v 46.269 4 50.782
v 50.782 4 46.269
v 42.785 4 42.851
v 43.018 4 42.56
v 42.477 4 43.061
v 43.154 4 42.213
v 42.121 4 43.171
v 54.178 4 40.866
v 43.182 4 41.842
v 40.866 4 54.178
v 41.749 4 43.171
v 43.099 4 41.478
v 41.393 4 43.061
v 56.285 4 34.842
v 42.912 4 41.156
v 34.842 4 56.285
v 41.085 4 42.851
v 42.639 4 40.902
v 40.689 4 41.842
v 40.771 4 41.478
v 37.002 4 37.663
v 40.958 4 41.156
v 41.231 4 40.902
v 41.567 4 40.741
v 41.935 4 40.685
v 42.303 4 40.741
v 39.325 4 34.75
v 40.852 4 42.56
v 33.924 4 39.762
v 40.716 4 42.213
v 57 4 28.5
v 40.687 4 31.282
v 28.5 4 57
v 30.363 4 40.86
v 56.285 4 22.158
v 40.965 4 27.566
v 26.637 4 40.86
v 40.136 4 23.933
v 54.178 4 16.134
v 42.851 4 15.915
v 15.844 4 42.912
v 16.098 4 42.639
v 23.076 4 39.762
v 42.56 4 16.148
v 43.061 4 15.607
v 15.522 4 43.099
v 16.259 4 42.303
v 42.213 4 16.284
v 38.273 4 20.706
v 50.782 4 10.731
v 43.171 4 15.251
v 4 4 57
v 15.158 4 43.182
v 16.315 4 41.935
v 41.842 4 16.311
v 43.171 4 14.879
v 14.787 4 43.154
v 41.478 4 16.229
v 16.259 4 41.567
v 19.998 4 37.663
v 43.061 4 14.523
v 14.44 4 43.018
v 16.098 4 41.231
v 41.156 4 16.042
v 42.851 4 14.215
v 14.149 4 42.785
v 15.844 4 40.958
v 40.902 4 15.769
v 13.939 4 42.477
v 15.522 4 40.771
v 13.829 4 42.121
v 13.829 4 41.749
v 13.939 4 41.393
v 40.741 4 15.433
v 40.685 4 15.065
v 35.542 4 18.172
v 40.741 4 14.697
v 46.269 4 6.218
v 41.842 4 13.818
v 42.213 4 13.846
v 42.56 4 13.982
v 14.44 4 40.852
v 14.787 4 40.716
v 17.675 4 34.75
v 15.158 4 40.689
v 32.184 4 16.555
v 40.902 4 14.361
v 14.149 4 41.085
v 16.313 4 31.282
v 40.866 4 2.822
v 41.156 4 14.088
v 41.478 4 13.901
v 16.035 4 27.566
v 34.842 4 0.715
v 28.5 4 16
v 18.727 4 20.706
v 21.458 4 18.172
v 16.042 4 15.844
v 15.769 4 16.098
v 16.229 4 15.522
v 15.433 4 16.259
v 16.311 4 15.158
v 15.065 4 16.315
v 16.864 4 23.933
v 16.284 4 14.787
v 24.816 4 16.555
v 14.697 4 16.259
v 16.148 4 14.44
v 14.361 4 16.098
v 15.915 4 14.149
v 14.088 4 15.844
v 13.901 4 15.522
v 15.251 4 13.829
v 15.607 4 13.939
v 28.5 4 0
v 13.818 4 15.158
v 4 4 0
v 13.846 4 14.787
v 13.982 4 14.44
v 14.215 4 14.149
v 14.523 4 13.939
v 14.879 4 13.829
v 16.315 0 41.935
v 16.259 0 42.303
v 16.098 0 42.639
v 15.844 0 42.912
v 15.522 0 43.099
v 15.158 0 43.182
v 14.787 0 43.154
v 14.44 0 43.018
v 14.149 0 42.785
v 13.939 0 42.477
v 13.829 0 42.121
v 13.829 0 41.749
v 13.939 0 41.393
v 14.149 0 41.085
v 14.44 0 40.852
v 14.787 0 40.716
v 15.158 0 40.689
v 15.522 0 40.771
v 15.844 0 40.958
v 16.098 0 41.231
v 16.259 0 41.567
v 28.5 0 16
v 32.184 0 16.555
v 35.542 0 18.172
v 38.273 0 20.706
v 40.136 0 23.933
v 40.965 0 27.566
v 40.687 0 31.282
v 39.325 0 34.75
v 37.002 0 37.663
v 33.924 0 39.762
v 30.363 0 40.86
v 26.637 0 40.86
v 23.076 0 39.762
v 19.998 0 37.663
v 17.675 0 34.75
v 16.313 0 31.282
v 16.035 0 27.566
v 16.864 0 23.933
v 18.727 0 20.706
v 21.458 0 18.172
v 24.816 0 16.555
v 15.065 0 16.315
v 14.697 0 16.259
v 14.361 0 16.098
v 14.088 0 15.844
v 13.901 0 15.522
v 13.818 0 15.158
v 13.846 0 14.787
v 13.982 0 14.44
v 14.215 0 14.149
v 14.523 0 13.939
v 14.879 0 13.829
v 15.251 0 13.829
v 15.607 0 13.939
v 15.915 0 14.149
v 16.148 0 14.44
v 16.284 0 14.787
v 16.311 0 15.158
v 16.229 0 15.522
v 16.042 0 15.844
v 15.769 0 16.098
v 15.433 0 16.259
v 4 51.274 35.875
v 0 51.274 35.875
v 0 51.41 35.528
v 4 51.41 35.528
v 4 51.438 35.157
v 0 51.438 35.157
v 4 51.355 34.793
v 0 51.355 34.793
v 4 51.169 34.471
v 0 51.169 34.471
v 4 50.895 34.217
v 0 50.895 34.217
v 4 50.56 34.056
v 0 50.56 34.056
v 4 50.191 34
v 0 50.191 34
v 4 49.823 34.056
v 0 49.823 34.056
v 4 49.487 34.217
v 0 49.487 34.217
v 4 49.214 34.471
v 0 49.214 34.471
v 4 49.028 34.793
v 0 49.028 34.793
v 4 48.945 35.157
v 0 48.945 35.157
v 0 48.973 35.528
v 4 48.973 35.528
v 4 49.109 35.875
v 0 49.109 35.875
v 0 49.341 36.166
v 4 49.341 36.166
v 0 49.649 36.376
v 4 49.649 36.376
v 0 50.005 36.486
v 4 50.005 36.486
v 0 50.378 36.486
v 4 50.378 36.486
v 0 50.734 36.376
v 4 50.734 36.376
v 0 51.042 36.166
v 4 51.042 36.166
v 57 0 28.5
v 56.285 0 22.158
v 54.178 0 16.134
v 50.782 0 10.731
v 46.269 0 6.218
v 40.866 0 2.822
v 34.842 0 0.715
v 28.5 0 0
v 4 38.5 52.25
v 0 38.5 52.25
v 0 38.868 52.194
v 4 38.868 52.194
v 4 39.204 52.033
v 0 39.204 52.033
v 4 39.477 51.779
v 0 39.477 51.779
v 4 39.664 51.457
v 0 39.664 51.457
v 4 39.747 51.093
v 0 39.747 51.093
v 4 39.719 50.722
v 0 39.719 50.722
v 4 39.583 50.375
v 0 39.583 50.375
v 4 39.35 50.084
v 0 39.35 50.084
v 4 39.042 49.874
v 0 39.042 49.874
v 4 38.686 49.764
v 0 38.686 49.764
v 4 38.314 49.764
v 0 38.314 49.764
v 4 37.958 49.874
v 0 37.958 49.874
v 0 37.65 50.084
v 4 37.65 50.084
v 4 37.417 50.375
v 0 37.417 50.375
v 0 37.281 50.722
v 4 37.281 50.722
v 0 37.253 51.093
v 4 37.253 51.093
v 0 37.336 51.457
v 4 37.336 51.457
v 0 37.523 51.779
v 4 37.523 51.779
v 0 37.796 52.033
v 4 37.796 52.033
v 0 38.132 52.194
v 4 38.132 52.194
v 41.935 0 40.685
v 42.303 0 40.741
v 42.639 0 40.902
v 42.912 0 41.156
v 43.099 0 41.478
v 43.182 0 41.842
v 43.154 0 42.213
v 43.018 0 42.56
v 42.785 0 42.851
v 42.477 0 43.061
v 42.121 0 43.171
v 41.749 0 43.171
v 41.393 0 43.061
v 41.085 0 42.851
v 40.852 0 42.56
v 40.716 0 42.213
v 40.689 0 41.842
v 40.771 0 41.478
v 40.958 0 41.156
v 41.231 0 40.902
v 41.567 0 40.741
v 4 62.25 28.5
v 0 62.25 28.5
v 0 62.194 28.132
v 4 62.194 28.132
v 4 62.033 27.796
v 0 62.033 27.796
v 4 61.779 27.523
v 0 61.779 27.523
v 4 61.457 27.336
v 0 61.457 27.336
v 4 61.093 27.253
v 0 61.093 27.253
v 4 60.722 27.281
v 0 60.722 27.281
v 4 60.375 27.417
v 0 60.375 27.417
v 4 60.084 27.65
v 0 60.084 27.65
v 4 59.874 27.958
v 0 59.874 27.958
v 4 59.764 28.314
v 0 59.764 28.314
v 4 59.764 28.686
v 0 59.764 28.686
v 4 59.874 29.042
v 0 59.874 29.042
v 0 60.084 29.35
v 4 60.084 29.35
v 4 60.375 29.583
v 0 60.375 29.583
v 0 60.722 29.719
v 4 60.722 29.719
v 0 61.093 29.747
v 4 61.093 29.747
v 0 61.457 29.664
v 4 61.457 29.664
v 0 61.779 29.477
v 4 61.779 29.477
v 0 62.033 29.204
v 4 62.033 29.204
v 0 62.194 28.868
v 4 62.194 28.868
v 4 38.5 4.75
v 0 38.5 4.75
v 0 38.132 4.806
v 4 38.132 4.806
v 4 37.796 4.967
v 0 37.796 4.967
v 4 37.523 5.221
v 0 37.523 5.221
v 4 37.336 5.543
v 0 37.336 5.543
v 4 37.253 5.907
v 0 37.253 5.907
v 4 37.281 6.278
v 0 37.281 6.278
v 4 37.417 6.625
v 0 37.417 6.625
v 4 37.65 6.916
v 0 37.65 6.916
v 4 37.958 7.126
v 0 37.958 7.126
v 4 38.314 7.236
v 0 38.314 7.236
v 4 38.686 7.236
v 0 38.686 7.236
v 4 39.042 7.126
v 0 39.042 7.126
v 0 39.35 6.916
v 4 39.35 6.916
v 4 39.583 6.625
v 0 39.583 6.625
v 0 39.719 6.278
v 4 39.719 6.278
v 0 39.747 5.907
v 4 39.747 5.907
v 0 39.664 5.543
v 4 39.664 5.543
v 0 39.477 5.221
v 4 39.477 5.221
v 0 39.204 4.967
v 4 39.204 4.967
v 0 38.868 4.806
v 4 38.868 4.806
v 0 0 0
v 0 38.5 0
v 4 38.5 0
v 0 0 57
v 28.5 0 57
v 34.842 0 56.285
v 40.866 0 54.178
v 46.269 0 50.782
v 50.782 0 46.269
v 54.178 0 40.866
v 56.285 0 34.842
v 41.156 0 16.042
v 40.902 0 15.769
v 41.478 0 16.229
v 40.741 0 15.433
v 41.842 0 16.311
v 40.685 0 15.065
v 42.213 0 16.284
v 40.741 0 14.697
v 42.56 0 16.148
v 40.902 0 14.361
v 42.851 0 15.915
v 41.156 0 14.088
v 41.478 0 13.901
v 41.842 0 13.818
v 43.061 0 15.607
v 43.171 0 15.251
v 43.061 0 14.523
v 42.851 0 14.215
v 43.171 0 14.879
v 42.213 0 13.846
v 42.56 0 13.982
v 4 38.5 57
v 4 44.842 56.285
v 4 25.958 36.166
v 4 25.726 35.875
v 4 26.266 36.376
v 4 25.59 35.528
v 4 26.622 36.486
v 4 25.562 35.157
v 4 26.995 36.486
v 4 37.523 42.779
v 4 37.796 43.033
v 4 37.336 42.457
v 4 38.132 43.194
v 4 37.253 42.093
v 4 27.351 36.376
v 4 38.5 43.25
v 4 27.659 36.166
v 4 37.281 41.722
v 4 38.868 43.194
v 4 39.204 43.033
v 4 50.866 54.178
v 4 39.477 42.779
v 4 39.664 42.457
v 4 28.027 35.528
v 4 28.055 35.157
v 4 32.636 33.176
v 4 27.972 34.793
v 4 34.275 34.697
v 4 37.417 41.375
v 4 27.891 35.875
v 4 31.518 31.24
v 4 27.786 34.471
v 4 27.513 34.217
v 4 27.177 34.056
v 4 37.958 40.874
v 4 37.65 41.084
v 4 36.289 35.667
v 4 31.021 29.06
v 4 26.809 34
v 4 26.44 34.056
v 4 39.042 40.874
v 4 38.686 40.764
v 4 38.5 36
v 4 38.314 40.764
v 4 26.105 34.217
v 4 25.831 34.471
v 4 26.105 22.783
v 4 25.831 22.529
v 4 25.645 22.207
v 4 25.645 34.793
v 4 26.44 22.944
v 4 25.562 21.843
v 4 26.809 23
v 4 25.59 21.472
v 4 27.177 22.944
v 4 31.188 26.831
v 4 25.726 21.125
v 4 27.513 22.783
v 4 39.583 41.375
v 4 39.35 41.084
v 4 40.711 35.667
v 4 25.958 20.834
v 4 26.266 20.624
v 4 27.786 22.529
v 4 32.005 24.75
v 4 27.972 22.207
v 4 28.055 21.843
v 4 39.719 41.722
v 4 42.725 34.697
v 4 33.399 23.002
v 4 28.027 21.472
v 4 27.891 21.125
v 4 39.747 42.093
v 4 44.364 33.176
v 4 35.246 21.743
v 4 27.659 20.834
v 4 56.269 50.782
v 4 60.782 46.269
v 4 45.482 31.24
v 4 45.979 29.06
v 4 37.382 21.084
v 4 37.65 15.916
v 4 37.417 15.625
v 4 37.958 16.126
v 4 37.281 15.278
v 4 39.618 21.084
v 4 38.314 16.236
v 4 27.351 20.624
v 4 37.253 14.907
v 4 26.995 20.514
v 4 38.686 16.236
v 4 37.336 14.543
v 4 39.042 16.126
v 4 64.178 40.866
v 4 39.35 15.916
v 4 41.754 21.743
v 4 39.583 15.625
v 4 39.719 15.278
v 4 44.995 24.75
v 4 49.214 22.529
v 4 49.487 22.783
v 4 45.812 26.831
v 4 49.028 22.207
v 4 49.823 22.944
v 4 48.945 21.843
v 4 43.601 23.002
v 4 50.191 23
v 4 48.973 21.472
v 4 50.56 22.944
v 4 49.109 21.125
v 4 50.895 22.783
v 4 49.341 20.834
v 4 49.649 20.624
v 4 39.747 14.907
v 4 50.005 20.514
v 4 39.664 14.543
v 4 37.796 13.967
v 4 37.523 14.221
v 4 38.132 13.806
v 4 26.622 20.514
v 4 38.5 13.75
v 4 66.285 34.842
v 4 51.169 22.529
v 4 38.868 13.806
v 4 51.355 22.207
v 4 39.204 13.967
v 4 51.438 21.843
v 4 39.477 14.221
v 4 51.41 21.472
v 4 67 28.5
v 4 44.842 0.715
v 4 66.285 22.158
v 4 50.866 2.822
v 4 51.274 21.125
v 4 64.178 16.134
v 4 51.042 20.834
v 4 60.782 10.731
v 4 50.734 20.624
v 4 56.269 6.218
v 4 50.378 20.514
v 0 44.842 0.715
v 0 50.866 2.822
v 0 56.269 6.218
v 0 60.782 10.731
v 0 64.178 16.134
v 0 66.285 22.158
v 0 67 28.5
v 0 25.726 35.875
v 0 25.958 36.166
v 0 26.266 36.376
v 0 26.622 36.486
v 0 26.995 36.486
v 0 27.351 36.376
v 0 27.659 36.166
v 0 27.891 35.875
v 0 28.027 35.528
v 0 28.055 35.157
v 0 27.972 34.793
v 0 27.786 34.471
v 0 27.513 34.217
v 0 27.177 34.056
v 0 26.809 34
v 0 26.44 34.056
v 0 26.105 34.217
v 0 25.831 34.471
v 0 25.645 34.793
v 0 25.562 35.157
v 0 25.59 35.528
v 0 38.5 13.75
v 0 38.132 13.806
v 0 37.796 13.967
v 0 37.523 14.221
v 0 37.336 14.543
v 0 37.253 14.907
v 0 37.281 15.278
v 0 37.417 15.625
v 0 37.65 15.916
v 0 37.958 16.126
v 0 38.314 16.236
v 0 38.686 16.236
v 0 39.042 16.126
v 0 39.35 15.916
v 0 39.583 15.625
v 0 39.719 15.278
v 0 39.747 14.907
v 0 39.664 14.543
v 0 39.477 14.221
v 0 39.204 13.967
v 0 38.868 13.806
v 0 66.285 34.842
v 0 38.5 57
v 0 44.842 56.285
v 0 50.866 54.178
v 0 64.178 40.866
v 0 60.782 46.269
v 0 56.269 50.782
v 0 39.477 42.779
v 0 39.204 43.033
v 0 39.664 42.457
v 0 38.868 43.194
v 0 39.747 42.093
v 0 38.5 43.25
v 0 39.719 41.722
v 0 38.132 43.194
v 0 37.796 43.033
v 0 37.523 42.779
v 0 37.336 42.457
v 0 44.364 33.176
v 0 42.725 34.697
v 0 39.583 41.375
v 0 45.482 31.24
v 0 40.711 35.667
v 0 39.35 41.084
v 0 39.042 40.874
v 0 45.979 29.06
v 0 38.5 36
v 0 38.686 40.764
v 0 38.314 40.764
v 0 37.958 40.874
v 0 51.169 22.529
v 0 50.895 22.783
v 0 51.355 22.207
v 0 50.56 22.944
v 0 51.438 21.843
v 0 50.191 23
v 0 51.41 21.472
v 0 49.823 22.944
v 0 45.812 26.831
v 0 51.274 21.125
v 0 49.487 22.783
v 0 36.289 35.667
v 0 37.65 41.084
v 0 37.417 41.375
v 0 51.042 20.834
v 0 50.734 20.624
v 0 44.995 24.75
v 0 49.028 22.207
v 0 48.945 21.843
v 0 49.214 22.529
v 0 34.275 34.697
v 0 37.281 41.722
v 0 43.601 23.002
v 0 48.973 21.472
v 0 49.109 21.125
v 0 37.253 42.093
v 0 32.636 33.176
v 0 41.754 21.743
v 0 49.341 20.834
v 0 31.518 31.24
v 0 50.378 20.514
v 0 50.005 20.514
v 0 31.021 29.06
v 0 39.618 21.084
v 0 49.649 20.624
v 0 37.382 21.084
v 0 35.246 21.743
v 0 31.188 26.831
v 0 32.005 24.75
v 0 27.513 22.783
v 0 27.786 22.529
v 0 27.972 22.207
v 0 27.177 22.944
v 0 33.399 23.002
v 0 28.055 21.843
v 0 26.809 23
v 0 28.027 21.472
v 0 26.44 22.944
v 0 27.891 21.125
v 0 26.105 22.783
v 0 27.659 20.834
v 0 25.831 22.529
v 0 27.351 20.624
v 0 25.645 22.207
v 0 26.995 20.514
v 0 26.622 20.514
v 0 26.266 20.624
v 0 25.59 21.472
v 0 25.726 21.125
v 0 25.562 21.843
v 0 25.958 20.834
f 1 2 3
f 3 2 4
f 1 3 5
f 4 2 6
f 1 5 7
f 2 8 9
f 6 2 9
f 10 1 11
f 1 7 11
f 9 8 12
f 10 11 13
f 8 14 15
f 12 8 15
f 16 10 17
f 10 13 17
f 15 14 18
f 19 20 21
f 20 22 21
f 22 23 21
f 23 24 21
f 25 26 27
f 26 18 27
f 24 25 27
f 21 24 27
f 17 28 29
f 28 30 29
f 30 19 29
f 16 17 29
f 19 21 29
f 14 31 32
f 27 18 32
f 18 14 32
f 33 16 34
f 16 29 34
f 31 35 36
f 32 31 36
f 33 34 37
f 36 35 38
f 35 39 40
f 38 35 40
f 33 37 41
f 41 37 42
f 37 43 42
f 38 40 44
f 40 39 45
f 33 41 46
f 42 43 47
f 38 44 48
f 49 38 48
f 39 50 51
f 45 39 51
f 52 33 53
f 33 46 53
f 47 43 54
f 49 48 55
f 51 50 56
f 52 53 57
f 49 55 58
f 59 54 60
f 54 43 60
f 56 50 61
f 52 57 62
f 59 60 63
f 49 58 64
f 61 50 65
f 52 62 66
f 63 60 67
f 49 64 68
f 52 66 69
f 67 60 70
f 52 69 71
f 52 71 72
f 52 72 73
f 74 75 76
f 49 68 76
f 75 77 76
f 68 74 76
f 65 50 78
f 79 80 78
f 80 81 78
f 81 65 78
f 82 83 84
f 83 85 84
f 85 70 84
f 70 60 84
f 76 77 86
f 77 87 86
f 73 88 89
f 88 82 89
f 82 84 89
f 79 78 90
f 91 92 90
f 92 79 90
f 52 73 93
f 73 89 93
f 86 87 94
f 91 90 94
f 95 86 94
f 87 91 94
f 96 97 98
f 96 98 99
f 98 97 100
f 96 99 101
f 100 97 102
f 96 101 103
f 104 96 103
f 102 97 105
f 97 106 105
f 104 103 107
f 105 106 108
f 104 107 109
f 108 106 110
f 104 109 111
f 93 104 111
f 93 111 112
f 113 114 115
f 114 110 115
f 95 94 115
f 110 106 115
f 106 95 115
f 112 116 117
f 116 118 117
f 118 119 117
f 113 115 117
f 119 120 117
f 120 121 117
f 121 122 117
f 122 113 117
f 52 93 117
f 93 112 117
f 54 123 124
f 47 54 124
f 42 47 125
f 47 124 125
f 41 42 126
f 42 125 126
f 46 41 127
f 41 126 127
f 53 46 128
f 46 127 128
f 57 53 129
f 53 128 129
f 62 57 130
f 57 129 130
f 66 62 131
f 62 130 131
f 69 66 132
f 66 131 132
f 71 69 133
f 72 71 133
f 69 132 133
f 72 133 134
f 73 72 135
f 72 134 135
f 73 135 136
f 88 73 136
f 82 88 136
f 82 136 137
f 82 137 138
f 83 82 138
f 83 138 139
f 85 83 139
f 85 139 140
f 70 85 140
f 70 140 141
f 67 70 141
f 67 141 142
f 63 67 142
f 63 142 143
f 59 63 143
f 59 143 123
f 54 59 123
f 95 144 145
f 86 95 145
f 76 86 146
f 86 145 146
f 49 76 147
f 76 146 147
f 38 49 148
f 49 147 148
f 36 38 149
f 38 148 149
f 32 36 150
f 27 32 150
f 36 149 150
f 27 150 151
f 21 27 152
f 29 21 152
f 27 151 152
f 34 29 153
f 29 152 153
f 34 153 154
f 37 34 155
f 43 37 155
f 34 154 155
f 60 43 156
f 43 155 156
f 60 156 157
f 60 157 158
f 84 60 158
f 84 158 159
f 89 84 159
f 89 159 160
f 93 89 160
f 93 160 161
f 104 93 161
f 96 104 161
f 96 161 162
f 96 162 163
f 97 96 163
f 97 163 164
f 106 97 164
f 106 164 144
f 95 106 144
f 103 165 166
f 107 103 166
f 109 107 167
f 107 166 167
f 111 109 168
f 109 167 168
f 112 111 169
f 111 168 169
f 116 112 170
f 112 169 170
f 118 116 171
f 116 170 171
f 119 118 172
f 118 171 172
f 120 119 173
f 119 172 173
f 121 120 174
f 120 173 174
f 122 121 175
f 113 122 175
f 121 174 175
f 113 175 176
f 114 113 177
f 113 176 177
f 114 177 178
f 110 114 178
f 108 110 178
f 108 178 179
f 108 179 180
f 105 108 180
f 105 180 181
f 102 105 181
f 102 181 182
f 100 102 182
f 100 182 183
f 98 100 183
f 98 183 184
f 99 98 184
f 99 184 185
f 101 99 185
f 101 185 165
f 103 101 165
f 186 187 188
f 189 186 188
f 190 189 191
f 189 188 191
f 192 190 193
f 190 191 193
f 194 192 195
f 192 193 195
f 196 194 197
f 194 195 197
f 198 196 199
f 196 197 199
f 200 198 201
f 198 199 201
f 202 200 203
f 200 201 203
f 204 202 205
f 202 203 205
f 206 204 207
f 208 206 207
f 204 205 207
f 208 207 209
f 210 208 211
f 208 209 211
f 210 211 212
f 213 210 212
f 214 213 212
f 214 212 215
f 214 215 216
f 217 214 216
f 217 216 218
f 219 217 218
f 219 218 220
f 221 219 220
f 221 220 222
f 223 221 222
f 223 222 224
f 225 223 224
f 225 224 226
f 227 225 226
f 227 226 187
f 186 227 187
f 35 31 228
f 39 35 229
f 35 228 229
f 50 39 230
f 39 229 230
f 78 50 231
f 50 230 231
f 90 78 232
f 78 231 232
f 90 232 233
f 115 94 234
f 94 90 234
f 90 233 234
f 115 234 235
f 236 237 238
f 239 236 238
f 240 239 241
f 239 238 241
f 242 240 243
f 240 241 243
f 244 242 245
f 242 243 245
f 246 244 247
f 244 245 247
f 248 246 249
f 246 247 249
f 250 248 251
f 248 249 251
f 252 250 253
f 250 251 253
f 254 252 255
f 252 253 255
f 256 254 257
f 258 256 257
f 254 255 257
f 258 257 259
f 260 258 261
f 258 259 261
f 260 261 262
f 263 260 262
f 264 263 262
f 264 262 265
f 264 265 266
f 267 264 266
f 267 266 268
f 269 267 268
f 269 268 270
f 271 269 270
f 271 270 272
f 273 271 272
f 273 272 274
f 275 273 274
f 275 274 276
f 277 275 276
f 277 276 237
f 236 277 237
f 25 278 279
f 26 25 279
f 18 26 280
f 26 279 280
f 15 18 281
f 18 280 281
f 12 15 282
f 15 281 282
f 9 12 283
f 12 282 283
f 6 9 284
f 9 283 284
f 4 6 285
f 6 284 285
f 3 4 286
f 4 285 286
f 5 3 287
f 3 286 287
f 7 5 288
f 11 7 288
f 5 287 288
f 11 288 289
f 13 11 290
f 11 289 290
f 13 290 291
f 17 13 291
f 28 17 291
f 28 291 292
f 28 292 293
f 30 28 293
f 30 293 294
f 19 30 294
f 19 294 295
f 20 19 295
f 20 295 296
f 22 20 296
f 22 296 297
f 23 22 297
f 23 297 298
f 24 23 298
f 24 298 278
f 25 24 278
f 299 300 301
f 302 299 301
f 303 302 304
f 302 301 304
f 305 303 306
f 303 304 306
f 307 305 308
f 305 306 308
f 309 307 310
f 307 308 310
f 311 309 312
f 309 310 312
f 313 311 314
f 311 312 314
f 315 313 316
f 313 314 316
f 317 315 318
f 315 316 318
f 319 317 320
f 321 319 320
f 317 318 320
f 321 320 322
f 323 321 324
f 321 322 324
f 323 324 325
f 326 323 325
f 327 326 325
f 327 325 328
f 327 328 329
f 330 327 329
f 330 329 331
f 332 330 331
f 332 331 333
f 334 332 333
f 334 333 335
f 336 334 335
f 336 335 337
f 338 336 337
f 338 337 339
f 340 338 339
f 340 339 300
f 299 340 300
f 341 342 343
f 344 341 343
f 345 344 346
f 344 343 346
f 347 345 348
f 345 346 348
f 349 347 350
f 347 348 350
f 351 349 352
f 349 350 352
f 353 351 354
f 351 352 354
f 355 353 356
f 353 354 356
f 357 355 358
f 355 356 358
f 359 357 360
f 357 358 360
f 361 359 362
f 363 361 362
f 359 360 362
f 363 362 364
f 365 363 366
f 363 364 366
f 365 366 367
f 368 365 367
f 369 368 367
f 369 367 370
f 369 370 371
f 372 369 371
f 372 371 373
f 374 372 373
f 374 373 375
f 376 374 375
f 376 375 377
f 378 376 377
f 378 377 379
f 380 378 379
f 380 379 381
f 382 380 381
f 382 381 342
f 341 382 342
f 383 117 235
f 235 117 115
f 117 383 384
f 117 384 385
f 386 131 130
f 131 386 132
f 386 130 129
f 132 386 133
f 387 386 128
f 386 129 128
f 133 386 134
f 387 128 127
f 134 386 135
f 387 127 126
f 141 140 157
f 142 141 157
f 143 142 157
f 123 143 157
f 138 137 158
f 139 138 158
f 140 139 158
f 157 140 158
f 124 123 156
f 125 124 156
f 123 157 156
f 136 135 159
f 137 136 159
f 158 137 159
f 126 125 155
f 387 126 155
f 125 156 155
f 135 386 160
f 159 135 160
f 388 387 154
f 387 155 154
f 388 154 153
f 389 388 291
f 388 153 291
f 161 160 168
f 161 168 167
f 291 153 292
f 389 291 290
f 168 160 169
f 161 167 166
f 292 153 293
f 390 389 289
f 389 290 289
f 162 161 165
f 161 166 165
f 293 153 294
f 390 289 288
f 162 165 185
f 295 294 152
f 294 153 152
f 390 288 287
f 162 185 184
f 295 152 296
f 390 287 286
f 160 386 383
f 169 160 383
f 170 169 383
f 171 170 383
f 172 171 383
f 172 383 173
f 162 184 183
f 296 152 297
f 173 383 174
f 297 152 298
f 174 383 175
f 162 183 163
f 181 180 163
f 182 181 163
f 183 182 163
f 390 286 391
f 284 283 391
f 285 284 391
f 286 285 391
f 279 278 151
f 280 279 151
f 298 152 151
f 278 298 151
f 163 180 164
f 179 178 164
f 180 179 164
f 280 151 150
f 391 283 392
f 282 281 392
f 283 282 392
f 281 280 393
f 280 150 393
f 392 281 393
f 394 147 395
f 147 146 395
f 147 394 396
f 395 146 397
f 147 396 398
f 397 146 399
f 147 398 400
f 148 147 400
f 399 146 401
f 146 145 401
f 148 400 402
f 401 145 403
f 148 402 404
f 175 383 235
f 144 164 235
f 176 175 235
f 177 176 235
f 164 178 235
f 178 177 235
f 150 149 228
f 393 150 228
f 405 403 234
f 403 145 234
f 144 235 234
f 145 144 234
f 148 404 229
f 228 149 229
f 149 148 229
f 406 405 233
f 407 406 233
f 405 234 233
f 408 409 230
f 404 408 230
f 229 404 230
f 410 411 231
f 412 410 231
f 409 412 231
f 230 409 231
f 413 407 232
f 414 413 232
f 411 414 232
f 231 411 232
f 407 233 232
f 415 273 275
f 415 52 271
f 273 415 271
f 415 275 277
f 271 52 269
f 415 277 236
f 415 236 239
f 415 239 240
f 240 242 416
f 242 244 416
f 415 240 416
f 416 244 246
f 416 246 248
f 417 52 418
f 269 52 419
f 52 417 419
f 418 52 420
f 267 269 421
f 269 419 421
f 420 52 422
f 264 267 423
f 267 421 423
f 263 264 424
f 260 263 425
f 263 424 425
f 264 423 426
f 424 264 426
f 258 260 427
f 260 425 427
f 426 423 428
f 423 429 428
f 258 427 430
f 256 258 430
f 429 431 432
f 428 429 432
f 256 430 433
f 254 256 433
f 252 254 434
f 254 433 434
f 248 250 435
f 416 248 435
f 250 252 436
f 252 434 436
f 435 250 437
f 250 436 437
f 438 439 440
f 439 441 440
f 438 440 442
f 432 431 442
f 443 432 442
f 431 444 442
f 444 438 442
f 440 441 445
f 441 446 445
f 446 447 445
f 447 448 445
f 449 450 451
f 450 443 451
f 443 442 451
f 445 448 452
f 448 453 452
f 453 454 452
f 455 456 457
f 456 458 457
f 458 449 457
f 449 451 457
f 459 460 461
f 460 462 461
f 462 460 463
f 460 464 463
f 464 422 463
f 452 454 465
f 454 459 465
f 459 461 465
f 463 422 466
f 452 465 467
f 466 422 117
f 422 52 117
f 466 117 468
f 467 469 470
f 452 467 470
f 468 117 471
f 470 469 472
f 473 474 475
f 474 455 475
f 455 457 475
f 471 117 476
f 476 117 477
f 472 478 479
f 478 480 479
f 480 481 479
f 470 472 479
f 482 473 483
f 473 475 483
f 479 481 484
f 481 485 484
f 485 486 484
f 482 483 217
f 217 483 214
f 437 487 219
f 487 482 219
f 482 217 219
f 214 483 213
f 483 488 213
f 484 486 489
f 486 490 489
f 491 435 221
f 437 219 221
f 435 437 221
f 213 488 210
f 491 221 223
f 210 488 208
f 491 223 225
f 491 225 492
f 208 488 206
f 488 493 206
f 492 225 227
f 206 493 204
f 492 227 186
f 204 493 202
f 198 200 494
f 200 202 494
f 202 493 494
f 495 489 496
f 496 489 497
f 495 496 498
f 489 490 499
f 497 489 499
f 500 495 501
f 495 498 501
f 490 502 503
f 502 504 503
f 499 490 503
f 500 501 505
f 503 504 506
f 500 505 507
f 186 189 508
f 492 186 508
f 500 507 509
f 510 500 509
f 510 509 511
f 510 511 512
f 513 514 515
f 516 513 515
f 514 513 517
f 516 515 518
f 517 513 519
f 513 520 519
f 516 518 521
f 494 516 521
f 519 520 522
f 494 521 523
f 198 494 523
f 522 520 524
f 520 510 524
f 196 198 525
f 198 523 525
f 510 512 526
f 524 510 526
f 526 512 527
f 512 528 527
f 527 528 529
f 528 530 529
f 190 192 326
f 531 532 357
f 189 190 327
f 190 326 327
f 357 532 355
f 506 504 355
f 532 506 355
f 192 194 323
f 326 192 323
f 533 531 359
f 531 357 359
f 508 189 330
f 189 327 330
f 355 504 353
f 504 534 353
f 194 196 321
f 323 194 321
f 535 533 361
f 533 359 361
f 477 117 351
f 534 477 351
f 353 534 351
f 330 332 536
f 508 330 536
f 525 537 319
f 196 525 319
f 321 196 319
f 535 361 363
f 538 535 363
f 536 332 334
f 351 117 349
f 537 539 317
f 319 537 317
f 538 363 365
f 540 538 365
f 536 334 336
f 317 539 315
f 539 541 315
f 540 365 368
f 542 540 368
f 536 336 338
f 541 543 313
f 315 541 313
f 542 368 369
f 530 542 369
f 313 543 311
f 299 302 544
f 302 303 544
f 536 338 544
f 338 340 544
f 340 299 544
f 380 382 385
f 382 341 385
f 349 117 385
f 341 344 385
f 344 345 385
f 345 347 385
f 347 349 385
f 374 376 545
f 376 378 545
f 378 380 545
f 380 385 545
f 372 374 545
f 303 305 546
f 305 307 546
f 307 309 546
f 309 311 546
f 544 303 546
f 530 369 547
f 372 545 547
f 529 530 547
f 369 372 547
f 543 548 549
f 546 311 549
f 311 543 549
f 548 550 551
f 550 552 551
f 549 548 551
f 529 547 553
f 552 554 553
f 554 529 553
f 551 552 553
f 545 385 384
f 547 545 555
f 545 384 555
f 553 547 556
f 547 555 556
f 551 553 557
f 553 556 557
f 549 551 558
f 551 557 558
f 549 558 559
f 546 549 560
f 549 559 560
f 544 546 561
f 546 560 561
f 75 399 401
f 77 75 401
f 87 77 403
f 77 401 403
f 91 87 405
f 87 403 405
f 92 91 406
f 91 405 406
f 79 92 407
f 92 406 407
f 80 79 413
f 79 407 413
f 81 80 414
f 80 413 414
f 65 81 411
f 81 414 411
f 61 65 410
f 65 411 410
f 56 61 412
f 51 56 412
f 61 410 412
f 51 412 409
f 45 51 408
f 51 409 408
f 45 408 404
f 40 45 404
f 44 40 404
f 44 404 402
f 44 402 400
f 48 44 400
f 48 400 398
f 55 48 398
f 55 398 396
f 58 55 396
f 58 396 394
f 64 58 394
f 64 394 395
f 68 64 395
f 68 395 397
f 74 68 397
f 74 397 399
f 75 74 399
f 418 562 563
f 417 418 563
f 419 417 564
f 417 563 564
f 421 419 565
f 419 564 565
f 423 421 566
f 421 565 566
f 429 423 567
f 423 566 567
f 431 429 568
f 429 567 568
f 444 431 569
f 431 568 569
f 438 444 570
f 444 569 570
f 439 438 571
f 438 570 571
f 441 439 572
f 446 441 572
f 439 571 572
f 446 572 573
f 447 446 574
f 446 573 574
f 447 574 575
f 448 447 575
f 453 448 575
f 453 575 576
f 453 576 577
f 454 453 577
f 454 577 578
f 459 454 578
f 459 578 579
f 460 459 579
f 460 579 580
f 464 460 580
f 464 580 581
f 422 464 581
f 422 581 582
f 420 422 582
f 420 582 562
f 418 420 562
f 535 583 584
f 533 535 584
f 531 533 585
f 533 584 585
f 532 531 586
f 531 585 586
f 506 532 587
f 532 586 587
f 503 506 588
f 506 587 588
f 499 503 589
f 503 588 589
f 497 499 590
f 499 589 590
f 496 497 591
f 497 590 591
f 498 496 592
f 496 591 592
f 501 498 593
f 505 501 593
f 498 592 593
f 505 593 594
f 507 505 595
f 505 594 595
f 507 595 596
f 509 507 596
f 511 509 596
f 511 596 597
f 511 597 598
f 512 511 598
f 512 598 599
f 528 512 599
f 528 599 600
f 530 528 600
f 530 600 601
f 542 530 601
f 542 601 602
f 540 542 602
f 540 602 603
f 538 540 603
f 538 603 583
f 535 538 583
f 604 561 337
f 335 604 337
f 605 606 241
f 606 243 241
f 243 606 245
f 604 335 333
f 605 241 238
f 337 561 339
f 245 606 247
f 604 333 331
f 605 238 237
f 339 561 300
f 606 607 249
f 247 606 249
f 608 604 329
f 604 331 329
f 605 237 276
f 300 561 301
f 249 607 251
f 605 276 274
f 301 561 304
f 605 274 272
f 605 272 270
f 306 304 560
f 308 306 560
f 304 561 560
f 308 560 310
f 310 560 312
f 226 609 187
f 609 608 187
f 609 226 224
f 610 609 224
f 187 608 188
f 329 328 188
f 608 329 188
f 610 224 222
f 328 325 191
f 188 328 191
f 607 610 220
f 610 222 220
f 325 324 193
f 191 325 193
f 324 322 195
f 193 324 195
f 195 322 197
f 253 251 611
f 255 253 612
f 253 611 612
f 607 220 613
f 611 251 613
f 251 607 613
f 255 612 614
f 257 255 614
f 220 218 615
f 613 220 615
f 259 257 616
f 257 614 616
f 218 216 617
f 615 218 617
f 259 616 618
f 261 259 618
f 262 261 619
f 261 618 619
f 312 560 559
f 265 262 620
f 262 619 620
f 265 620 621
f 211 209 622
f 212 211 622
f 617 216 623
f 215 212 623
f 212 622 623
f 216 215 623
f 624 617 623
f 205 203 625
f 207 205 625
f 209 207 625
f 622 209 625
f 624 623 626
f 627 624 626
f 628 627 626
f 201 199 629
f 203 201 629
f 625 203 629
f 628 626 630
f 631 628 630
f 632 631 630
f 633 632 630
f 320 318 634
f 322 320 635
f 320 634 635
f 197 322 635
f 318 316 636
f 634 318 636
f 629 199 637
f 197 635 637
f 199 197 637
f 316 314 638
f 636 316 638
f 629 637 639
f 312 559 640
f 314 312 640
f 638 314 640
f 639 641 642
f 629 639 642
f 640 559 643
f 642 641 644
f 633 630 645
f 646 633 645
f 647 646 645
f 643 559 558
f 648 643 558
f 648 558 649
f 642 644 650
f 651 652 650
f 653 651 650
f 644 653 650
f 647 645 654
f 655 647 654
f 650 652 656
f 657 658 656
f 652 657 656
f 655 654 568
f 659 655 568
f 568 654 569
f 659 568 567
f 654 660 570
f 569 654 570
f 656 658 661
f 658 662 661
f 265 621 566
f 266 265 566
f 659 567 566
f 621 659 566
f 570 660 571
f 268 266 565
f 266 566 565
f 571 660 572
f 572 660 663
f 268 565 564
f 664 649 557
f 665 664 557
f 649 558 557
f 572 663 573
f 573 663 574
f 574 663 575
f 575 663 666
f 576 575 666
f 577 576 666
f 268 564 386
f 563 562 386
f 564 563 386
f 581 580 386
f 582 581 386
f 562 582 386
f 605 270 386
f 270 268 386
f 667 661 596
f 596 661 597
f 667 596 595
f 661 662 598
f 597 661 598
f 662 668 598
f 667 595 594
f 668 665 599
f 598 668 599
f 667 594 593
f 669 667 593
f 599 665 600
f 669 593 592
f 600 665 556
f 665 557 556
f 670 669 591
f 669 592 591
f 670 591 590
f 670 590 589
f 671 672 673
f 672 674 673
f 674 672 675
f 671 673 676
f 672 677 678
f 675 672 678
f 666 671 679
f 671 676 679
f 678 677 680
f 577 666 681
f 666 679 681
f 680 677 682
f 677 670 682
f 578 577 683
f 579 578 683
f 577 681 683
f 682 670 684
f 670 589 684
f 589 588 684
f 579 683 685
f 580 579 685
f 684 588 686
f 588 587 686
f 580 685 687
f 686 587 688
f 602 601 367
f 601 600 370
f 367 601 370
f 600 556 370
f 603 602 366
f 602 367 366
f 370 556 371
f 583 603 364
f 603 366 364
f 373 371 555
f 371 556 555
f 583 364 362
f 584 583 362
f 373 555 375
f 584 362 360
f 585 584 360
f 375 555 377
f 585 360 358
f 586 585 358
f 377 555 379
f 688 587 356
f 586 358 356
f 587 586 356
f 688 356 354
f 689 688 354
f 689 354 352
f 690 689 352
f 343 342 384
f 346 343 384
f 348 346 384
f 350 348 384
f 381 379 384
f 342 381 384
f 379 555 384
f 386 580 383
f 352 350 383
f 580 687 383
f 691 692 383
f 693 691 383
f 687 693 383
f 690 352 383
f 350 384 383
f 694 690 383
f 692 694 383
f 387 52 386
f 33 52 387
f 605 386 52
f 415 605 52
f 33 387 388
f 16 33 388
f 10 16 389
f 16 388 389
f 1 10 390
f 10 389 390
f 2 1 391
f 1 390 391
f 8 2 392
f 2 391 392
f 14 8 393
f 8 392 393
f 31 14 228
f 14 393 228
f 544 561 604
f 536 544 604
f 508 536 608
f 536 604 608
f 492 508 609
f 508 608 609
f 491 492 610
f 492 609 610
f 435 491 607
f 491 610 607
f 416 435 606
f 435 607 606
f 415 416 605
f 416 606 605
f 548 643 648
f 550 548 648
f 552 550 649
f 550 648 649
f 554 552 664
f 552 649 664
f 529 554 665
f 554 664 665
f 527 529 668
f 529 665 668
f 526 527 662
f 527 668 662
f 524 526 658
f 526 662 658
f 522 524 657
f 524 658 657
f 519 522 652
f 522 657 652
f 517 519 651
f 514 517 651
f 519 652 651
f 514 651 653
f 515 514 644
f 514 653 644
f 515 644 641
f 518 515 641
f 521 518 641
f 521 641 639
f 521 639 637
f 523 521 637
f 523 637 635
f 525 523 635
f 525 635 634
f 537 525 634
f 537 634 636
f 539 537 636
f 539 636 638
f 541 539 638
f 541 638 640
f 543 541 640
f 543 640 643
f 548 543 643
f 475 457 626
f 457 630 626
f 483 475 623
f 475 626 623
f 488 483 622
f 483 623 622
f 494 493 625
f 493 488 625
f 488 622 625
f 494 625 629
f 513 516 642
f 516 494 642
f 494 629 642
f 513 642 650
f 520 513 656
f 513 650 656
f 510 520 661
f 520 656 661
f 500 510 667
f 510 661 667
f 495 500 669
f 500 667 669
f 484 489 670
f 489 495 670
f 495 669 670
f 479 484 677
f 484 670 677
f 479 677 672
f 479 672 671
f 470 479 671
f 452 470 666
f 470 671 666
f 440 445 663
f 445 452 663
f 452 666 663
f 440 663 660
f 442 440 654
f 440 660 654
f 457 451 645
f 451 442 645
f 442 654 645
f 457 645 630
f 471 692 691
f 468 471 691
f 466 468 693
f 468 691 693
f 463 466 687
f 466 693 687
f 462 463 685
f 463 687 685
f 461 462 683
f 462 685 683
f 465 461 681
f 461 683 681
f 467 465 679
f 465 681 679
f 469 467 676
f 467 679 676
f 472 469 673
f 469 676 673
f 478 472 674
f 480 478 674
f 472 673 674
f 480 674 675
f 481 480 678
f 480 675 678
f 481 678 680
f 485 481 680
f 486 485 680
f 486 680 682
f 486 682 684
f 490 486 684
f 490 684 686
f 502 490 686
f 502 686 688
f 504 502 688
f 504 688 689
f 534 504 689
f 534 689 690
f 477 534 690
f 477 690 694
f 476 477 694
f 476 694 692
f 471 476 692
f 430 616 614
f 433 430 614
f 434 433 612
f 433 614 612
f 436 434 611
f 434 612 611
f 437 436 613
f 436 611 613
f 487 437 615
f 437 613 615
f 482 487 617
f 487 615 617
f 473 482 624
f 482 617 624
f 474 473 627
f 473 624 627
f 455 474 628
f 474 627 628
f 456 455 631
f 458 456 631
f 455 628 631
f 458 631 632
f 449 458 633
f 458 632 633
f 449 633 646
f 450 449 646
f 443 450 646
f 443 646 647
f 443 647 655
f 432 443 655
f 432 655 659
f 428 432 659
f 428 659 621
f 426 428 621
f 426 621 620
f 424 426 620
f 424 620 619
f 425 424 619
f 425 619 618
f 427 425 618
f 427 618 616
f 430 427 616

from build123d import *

# Parameters (mm, degrees)
EXTRUDE_1_DEPTH          = 57
CUT_EXTRUDE_1_DEPTH      = 57
CUT_EXTRUDE_2_DEPTH      = 57
SKETCH_5_R               = 7.5
SKETCH_5_R_2             = 1.25
CUT_EXTRUDE_3_DEPTH      = 57
PATTERN_CIRCULAR_1_COUNT = 6
SKETCH_6_R               = 12.5
SKETCH_6_R_2             = 1.25
CUT_EXTRUDE_4_DEPTH      = 57
PATTERN_CIRCULAR_2_COUNT = 4
SKETCH_7_R               = 1.25
CUT_EXTRUDE_5_DEPTH      = 10
PATTERN_CIRCULAR_3_COUNT = 3
PATTERN_CIRCULAR_3_ANGLE = 180


with BuildPart() as part:
    # 草图1 → 凸台-拉伸1 (new body)
    with BuildSketch(Plane.XY):
        Polygon((0, 67), (0, 0), (57, 0), (57, 4), (4, 4), (4, 67), align=None)
    extrude(amount=EXTRUDE_1_DEPTH)

    # 草图3 → 切除-拉伸1 (cut)
    with BuildSketch(Plane.XZ):
        with BuildLine():
            Line((57, 57), (28.5, 57))
            ThreePointArc((28.5, 57), (48.652543264, 48.652543264), (57, 28.5))
            Line((57, 28.5), (57, 57))
        make_face()
        with BuildLine():
            ThreePointArc((57, 28.5), (48.652543264, 8.347456736), (28.5, 0))
            Line((28.5, 0), (57, 0))
            Line((57, 0), (57, 28.5))
        make_face()
    extrude(amount=-CUT_EXTRUDE_1_DEPTH, mode=Mode.SUBTRACT)

    # 草图4 → 切除-拉伸2 (cut)
    with BuildSketch(Plane.ZY):
        with BuildLine():
            Line((57, 67), (28.5, 67))
            ThreePointArc((28.5, 67), (48.652543264, 58.652543264), (57, 38.5))
            Line((57, 38.5), (57, 67))
        make_face()
        with BuildLine():
            Line((28.5, 67), (0, 67))
            Line((0, 67), (0, 38.5))
            ThreePointArc((0, 38.5), (8.347456736, 58.652543264), (28.5, 67))
        make_face()
    extrude(amount=-CUT_EXTRUDE_2_DEPTH, mode=Mode.SUBTRACT)

    # 草图5 → 切除-拉伸3 (cut)
    with BuildSketch(Plane.ZY):
        with Locations((28.5, 38.5)):
            Circle(SKETCH_5_R)
        with Locations((42, 38.5)):
            Circle(SKETCH_5_R_2)
    cut_extrude_3 = extrude(amount=-CUT_EXTRUDE_3_DEPTH, mode=Mode.SUBTRACT)

    # 阵列(圆周)1: 切除-拉伸3 ×6 about axis
    pattern_circular_1_axis = Axis((0, 38.5, 28.5), (1, 0, 0))
    for i in range(1, PATTERN_CIRCULAR_1_COUNT):
        add(cut_extrude_3.rotate(pattern_circular_1_axis, i * 360 / PATTERN_CIRCULAR_1_COUNT), mode=Mode.SUBTRACT)

    # 草图6 → 切除-拉伸4 (cut)
    with BuildSketch(Plane.XZ):
        with Locations(Location((28.5, 28.5, 0), (0, 0, 270))):
            Circle(SKETCH_6_R)
        with Locations(Location((41.935028843, 41.935028843, 0), (0, 0, 270))):
            Circle(SKETCH_6_R_2)
    cut_extrude_4 = extrude(amount=-CUT_EXTRUDE_4_DEPTH, mode=Mode.SUBTRACT)

    # 阵列(圆周)2: 切除-拉伸4 ×4 about axis
    pattern_circular_2_axis = Axis((28.5, 0, 28.5), (0, 1, 0))
    for i in range(1, PATTERN_CIRCULAR_2_COUNT):
        add(cut_extrude_4.rotate(pattern_circular_2_axis, i * 360 / PATTERN_CIRCULAR_2_COUNT), mode=Mode.SUBTRACT)

    # 草图7 → 切除-拉伸5 (cut)
    with BuildSketch(Plane.ZY):
        with Locations((51, 38.5)):
            Circle(SKETCH_7_R)
    cut_extrude_5 = extrude(amount=-CUT_EXTRUDE_5_DEPTH, mode=Mode.SUBTRACT)

    # 阵列(圆周)3: 切除-拉伸5 ×3 about axis
    pattern_circular_3_axis = Axis((0, 38.5, 28.5), (-1, 0, 0))
    for i in range(1, PATTERN_CIRCULAR_3_COUNT):
        add(cut_extrude_5.rotate(pattern_circular_3_axis, i * PATTERN_CIRCULAR_3_ANGLE / (PATTERN_CIRCULAR_3_COUNT - 1)), mode=Mode.SUBTRACT)


solid = part.part
